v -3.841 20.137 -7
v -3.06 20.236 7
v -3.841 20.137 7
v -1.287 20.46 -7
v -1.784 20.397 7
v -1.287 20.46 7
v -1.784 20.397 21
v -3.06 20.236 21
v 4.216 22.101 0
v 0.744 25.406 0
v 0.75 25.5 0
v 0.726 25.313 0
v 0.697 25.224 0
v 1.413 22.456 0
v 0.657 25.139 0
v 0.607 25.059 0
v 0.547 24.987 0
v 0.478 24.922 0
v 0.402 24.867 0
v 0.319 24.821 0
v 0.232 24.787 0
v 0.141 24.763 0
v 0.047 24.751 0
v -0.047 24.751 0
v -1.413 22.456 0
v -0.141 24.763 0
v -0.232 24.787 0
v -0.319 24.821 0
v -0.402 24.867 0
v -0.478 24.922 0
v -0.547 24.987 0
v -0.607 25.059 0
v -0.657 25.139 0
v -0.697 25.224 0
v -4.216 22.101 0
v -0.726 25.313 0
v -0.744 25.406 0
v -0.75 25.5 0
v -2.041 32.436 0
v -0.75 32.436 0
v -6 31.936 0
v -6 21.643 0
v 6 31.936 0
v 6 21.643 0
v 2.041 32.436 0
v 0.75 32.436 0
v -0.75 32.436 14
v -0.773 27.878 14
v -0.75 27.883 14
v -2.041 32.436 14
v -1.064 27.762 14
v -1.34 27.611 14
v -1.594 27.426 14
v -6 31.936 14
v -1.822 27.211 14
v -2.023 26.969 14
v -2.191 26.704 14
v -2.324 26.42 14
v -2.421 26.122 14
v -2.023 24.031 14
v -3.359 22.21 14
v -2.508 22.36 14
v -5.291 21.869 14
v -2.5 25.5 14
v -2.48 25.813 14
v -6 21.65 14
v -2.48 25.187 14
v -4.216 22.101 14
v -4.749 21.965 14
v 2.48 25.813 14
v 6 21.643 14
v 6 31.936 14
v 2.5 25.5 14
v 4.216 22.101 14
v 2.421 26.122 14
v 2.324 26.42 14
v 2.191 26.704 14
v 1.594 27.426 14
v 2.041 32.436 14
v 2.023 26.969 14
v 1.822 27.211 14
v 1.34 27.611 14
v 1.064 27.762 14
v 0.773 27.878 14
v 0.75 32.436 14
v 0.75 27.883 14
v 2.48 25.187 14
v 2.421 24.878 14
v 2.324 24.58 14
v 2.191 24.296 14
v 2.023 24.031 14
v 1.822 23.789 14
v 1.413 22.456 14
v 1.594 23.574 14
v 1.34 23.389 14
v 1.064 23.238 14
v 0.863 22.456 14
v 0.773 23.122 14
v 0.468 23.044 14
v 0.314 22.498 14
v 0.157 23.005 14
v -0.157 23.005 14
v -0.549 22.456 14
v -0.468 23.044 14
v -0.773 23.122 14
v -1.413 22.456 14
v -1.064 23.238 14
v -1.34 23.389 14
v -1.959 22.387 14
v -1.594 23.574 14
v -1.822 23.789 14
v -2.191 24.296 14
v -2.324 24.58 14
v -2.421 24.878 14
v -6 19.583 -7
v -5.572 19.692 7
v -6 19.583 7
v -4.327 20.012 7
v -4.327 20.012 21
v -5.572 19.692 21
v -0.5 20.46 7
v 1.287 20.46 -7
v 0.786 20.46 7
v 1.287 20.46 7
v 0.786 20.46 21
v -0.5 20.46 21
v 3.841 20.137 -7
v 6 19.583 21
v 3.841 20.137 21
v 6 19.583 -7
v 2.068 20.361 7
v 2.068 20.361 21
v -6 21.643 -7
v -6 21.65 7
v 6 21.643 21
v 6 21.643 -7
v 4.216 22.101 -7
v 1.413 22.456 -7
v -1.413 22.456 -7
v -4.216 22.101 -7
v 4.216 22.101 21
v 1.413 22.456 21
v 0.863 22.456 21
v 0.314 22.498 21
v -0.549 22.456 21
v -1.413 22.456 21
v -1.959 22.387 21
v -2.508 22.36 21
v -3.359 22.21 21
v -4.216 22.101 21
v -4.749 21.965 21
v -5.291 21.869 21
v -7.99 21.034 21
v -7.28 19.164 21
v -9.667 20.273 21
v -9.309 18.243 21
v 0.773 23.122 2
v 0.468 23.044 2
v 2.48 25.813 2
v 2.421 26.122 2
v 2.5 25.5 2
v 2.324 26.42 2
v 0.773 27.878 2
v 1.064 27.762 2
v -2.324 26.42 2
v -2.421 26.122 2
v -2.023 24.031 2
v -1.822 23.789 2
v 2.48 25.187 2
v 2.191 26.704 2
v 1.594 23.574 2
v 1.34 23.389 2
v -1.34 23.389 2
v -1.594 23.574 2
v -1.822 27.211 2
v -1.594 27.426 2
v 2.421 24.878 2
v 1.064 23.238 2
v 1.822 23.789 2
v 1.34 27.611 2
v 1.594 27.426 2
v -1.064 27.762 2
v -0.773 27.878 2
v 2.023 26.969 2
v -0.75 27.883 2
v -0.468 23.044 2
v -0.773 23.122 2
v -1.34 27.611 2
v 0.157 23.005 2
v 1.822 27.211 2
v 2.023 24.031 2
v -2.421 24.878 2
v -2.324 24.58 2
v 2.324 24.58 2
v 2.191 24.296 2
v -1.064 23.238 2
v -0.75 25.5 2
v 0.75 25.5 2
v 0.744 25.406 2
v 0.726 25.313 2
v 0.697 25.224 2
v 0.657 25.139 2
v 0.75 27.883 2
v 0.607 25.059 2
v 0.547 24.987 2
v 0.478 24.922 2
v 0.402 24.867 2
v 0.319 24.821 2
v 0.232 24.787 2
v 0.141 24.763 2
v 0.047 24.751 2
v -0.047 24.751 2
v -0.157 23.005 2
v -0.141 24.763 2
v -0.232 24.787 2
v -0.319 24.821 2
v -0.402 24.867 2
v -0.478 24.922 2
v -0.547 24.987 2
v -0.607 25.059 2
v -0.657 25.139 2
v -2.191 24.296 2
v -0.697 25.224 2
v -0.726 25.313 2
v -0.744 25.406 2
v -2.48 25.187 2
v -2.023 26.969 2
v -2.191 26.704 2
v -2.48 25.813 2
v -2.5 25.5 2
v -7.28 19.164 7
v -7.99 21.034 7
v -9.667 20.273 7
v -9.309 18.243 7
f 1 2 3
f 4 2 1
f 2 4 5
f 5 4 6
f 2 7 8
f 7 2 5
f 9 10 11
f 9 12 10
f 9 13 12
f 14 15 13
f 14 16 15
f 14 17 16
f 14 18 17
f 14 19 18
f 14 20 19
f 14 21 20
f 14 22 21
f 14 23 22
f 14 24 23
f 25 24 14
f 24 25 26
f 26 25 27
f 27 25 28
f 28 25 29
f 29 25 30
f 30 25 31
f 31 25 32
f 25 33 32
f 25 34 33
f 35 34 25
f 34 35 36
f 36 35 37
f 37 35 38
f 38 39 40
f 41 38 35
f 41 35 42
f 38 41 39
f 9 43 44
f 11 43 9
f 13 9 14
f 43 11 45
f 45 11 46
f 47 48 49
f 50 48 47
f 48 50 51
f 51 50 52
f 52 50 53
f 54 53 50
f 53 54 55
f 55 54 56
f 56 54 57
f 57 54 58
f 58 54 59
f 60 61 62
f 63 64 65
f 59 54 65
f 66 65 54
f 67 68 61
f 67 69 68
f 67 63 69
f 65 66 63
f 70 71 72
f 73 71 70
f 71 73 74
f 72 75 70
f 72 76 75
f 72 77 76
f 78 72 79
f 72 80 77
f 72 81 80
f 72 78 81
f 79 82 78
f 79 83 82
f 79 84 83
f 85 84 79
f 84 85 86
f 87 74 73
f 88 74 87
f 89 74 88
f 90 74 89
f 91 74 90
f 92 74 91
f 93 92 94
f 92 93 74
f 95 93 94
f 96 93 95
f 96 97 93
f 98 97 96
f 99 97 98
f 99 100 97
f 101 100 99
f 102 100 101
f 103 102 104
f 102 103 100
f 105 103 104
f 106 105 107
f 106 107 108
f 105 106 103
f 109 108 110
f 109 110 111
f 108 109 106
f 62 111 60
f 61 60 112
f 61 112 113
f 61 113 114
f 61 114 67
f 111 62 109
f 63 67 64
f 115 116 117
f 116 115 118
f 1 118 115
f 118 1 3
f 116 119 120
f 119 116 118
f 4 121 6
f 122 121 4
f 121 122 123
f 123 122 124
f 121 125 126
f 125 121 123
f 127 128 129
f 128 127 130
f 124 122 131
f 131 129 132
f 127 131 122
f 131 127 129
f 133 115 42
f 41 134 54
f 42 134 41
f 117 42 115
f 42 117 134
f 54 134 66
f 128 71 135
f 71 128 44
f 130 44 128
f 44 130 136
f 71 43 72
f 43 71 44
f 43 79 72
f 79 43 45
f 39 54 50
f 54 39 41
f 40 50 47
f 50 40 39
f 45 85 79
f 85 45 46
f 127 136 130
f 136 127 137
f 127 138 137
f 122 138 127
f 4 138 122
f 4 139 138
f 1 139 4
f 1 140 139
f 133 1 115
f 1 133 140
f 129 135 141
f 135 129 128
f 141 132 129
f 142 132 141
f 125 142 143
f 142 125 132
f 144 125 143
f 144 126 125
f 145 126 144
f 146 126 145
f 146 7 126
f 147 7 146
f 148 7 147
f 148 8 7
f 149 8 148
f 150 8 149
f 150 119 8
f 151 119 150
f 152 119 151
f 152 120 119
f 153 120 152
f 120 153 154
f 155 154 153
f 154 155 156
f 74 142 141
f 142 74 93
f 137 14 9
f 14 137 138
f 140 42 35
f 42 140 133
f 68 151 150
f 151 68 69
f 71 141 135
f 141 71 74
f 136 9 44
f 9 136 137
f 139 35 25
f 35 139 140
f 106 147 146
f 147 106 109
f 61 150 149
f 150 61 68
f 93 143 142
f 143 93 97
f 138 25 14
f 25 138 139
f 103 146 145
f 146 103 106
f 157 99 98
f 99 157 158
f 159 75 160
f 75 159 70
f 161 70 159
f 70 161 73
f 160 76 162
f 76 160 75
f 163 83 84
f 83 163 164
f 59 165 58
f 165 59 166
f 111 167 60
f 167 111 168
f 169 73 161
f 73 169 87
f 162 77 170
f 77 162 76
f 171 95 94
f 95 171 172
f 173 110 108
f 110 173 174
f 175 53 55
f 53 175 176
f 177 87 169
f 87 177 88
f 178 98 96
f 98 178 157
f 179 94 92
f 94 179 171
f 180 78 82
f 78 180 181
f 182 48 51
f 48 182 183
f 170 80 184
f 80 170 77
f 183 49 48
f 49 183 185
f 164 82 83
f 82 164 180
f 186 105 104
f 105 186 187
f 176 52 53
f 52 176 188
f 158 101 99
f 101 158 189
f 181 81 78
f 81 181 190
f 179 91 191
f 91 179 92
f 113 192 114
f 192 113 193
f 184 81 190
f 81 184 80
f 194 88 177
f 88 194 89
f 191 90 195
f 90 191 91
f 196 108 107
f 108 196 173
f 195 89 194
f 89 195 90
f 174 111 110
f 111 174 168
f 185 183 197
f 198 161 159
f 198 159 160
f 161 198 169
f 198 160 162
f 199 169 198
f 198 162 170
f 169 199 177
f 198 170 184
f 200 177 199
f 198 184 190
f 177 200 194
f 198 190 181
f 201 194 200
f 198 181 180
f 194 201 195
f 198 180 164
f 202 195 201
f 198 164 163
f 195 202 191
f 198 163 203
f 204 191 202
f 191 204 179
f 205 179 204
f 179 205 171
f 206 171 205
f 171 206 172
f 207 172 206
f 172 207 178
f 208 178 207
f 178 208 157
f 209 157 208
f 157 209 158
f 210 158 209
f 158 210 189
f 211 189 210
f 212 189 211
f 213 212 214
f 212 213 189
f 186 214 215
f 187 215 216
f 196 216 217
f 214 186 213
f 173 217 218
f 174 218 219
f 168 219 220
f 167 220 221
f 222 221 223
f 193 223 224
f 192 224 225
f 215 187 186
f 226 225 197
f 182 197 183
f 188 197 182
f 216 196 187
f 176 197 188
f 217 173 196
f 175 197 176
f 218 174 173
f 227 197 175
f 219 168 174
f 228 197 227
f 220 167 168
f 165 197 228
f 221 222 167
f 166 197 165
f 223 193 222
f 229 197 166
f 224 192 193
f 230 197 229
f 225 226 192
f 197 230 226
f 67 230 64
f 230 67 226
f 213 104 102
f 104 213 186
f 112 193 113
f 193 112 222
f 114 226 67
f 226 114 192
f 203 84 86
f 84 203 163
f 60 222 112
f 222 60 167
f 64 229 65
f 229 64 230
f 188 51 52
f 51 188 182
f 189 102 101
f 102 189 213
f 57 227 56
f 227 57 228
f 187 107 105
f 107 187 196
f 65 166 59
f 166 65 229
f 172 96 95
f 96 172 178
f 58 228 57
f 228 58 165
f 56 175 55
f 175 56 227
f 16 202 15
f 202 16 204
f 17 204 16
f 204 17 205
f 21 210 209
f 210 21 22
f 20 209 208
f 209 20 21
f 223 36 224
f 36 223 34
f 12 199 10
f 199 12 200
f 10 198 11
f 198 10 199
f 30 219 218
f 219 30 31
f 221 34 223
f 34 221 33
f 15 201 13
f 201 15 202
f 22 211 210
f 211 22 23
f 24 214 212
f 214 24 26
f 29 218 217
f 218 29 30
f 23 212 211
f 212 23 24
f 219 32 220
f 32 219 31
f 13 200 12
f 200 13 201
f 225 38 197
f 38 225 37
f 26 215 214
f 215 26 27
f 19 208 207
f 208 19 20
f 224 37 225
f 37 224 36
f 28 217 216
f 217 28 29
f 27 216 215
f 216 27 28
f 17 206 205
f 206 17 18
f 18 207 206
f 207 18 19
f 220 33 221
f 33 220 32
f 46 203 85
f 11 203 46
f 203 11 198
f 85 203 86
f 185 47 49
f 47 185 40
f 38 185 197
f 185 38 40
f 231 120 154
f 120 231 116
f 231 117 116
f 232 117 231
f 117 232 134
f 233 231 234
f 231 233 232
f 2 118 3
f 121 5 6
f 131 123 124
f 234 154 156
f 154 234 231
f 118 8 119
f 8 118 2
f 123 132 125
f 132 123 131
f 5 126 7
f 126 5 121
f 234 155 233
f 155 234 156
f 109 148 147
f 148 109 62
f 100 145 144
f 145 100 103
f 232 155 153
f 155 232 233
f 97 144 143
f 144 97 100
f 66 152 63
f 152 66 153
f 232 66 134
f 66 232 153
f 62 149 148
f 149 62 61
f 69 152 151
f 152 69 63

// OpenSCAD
//tube diameters
D1=41; // original


//small hole diameters
d1=5; // hose
d2=6; 
d3=10; //existing clamp
$fn=50;


module shape_1(d_inner, d_outer, z){
    
    //D2 = D1 + 2* d3 + 4; //outer tube (for topmost bound)
    //Z = 15;
    SIDE_OFFS = 6;
    
    difference() {
        //color("red")
        cylinder(d=d_outer, h=z);

        union() {
            //tube diameter
            color("blue")
            cylinder(d=d_inner, h=z);
            
            //bottom bound 
            translate([-(d_outer/2), -(d_outer/2),0])
            cube([d_outer, d_outer/2, z]);

            //left bound
            translate([-(d_outer/2) - SIDE_OFFS,0,0])
                cube([d_outer/2, d_outer/2, z]);

            //right bound
            translate([ SIDE_OFFS,0,0])
                cube([d_outer/2, d_outer/2, z]);
            
        }
    }
}

module cutout(z){
    zz = 6; //existing hole
    CUTOUT = 1.5;
    
//    //left
//    rotate([0,0,12])
//    translate([0,(D1+d3)/2,0]) {        
//        translate([0,0,2]) {
//            cylinder(d=d1, h=z);                        
//        }
//        translate([0,0, -10])
//            cylinder(d=d3, h=zz + 10);
//        cylinder(d=CUTOUT, h=z);
//    }
//    
//    rotate([0,0,12])
//    translate([-CUTOUT/2,(D1+d3)/2,0]) 
//    cube([CUTOUT,d3,z]);


    
    //right

    //rotate([0,0,-12])
    translate([0,(D1+d3)/2,0]){
        translate([0,0,2]) {
            cylinder(d=d1, h=z);
        }
        cylinder(d=CUTOUT, h=z);
    }

    //rotate([0,0,-12])
    translate([-CUTOUT/2,(D1+d3)/2,0]) 
    cube([CUTOUT,d3,z]);

}

//xxx
Z = 14;

difference(){
    union()
    {
        shape_1(D1, D1 + 2* d3 + 4, Z);
        translate([0,0,-Z/2])
            shape_1(D1, D1 + 4, Z+14);
    }
    cutout(Z);
    
}
    translate([0,0,7])
    rotate([0,0,10])
     shape_1(D1, D1 + 4, (Z+14)/2);

//shape_1(D1, D1 + 2* d3 + 4, Z);


//color("red")
//cylinder(d=D1, h=15);
